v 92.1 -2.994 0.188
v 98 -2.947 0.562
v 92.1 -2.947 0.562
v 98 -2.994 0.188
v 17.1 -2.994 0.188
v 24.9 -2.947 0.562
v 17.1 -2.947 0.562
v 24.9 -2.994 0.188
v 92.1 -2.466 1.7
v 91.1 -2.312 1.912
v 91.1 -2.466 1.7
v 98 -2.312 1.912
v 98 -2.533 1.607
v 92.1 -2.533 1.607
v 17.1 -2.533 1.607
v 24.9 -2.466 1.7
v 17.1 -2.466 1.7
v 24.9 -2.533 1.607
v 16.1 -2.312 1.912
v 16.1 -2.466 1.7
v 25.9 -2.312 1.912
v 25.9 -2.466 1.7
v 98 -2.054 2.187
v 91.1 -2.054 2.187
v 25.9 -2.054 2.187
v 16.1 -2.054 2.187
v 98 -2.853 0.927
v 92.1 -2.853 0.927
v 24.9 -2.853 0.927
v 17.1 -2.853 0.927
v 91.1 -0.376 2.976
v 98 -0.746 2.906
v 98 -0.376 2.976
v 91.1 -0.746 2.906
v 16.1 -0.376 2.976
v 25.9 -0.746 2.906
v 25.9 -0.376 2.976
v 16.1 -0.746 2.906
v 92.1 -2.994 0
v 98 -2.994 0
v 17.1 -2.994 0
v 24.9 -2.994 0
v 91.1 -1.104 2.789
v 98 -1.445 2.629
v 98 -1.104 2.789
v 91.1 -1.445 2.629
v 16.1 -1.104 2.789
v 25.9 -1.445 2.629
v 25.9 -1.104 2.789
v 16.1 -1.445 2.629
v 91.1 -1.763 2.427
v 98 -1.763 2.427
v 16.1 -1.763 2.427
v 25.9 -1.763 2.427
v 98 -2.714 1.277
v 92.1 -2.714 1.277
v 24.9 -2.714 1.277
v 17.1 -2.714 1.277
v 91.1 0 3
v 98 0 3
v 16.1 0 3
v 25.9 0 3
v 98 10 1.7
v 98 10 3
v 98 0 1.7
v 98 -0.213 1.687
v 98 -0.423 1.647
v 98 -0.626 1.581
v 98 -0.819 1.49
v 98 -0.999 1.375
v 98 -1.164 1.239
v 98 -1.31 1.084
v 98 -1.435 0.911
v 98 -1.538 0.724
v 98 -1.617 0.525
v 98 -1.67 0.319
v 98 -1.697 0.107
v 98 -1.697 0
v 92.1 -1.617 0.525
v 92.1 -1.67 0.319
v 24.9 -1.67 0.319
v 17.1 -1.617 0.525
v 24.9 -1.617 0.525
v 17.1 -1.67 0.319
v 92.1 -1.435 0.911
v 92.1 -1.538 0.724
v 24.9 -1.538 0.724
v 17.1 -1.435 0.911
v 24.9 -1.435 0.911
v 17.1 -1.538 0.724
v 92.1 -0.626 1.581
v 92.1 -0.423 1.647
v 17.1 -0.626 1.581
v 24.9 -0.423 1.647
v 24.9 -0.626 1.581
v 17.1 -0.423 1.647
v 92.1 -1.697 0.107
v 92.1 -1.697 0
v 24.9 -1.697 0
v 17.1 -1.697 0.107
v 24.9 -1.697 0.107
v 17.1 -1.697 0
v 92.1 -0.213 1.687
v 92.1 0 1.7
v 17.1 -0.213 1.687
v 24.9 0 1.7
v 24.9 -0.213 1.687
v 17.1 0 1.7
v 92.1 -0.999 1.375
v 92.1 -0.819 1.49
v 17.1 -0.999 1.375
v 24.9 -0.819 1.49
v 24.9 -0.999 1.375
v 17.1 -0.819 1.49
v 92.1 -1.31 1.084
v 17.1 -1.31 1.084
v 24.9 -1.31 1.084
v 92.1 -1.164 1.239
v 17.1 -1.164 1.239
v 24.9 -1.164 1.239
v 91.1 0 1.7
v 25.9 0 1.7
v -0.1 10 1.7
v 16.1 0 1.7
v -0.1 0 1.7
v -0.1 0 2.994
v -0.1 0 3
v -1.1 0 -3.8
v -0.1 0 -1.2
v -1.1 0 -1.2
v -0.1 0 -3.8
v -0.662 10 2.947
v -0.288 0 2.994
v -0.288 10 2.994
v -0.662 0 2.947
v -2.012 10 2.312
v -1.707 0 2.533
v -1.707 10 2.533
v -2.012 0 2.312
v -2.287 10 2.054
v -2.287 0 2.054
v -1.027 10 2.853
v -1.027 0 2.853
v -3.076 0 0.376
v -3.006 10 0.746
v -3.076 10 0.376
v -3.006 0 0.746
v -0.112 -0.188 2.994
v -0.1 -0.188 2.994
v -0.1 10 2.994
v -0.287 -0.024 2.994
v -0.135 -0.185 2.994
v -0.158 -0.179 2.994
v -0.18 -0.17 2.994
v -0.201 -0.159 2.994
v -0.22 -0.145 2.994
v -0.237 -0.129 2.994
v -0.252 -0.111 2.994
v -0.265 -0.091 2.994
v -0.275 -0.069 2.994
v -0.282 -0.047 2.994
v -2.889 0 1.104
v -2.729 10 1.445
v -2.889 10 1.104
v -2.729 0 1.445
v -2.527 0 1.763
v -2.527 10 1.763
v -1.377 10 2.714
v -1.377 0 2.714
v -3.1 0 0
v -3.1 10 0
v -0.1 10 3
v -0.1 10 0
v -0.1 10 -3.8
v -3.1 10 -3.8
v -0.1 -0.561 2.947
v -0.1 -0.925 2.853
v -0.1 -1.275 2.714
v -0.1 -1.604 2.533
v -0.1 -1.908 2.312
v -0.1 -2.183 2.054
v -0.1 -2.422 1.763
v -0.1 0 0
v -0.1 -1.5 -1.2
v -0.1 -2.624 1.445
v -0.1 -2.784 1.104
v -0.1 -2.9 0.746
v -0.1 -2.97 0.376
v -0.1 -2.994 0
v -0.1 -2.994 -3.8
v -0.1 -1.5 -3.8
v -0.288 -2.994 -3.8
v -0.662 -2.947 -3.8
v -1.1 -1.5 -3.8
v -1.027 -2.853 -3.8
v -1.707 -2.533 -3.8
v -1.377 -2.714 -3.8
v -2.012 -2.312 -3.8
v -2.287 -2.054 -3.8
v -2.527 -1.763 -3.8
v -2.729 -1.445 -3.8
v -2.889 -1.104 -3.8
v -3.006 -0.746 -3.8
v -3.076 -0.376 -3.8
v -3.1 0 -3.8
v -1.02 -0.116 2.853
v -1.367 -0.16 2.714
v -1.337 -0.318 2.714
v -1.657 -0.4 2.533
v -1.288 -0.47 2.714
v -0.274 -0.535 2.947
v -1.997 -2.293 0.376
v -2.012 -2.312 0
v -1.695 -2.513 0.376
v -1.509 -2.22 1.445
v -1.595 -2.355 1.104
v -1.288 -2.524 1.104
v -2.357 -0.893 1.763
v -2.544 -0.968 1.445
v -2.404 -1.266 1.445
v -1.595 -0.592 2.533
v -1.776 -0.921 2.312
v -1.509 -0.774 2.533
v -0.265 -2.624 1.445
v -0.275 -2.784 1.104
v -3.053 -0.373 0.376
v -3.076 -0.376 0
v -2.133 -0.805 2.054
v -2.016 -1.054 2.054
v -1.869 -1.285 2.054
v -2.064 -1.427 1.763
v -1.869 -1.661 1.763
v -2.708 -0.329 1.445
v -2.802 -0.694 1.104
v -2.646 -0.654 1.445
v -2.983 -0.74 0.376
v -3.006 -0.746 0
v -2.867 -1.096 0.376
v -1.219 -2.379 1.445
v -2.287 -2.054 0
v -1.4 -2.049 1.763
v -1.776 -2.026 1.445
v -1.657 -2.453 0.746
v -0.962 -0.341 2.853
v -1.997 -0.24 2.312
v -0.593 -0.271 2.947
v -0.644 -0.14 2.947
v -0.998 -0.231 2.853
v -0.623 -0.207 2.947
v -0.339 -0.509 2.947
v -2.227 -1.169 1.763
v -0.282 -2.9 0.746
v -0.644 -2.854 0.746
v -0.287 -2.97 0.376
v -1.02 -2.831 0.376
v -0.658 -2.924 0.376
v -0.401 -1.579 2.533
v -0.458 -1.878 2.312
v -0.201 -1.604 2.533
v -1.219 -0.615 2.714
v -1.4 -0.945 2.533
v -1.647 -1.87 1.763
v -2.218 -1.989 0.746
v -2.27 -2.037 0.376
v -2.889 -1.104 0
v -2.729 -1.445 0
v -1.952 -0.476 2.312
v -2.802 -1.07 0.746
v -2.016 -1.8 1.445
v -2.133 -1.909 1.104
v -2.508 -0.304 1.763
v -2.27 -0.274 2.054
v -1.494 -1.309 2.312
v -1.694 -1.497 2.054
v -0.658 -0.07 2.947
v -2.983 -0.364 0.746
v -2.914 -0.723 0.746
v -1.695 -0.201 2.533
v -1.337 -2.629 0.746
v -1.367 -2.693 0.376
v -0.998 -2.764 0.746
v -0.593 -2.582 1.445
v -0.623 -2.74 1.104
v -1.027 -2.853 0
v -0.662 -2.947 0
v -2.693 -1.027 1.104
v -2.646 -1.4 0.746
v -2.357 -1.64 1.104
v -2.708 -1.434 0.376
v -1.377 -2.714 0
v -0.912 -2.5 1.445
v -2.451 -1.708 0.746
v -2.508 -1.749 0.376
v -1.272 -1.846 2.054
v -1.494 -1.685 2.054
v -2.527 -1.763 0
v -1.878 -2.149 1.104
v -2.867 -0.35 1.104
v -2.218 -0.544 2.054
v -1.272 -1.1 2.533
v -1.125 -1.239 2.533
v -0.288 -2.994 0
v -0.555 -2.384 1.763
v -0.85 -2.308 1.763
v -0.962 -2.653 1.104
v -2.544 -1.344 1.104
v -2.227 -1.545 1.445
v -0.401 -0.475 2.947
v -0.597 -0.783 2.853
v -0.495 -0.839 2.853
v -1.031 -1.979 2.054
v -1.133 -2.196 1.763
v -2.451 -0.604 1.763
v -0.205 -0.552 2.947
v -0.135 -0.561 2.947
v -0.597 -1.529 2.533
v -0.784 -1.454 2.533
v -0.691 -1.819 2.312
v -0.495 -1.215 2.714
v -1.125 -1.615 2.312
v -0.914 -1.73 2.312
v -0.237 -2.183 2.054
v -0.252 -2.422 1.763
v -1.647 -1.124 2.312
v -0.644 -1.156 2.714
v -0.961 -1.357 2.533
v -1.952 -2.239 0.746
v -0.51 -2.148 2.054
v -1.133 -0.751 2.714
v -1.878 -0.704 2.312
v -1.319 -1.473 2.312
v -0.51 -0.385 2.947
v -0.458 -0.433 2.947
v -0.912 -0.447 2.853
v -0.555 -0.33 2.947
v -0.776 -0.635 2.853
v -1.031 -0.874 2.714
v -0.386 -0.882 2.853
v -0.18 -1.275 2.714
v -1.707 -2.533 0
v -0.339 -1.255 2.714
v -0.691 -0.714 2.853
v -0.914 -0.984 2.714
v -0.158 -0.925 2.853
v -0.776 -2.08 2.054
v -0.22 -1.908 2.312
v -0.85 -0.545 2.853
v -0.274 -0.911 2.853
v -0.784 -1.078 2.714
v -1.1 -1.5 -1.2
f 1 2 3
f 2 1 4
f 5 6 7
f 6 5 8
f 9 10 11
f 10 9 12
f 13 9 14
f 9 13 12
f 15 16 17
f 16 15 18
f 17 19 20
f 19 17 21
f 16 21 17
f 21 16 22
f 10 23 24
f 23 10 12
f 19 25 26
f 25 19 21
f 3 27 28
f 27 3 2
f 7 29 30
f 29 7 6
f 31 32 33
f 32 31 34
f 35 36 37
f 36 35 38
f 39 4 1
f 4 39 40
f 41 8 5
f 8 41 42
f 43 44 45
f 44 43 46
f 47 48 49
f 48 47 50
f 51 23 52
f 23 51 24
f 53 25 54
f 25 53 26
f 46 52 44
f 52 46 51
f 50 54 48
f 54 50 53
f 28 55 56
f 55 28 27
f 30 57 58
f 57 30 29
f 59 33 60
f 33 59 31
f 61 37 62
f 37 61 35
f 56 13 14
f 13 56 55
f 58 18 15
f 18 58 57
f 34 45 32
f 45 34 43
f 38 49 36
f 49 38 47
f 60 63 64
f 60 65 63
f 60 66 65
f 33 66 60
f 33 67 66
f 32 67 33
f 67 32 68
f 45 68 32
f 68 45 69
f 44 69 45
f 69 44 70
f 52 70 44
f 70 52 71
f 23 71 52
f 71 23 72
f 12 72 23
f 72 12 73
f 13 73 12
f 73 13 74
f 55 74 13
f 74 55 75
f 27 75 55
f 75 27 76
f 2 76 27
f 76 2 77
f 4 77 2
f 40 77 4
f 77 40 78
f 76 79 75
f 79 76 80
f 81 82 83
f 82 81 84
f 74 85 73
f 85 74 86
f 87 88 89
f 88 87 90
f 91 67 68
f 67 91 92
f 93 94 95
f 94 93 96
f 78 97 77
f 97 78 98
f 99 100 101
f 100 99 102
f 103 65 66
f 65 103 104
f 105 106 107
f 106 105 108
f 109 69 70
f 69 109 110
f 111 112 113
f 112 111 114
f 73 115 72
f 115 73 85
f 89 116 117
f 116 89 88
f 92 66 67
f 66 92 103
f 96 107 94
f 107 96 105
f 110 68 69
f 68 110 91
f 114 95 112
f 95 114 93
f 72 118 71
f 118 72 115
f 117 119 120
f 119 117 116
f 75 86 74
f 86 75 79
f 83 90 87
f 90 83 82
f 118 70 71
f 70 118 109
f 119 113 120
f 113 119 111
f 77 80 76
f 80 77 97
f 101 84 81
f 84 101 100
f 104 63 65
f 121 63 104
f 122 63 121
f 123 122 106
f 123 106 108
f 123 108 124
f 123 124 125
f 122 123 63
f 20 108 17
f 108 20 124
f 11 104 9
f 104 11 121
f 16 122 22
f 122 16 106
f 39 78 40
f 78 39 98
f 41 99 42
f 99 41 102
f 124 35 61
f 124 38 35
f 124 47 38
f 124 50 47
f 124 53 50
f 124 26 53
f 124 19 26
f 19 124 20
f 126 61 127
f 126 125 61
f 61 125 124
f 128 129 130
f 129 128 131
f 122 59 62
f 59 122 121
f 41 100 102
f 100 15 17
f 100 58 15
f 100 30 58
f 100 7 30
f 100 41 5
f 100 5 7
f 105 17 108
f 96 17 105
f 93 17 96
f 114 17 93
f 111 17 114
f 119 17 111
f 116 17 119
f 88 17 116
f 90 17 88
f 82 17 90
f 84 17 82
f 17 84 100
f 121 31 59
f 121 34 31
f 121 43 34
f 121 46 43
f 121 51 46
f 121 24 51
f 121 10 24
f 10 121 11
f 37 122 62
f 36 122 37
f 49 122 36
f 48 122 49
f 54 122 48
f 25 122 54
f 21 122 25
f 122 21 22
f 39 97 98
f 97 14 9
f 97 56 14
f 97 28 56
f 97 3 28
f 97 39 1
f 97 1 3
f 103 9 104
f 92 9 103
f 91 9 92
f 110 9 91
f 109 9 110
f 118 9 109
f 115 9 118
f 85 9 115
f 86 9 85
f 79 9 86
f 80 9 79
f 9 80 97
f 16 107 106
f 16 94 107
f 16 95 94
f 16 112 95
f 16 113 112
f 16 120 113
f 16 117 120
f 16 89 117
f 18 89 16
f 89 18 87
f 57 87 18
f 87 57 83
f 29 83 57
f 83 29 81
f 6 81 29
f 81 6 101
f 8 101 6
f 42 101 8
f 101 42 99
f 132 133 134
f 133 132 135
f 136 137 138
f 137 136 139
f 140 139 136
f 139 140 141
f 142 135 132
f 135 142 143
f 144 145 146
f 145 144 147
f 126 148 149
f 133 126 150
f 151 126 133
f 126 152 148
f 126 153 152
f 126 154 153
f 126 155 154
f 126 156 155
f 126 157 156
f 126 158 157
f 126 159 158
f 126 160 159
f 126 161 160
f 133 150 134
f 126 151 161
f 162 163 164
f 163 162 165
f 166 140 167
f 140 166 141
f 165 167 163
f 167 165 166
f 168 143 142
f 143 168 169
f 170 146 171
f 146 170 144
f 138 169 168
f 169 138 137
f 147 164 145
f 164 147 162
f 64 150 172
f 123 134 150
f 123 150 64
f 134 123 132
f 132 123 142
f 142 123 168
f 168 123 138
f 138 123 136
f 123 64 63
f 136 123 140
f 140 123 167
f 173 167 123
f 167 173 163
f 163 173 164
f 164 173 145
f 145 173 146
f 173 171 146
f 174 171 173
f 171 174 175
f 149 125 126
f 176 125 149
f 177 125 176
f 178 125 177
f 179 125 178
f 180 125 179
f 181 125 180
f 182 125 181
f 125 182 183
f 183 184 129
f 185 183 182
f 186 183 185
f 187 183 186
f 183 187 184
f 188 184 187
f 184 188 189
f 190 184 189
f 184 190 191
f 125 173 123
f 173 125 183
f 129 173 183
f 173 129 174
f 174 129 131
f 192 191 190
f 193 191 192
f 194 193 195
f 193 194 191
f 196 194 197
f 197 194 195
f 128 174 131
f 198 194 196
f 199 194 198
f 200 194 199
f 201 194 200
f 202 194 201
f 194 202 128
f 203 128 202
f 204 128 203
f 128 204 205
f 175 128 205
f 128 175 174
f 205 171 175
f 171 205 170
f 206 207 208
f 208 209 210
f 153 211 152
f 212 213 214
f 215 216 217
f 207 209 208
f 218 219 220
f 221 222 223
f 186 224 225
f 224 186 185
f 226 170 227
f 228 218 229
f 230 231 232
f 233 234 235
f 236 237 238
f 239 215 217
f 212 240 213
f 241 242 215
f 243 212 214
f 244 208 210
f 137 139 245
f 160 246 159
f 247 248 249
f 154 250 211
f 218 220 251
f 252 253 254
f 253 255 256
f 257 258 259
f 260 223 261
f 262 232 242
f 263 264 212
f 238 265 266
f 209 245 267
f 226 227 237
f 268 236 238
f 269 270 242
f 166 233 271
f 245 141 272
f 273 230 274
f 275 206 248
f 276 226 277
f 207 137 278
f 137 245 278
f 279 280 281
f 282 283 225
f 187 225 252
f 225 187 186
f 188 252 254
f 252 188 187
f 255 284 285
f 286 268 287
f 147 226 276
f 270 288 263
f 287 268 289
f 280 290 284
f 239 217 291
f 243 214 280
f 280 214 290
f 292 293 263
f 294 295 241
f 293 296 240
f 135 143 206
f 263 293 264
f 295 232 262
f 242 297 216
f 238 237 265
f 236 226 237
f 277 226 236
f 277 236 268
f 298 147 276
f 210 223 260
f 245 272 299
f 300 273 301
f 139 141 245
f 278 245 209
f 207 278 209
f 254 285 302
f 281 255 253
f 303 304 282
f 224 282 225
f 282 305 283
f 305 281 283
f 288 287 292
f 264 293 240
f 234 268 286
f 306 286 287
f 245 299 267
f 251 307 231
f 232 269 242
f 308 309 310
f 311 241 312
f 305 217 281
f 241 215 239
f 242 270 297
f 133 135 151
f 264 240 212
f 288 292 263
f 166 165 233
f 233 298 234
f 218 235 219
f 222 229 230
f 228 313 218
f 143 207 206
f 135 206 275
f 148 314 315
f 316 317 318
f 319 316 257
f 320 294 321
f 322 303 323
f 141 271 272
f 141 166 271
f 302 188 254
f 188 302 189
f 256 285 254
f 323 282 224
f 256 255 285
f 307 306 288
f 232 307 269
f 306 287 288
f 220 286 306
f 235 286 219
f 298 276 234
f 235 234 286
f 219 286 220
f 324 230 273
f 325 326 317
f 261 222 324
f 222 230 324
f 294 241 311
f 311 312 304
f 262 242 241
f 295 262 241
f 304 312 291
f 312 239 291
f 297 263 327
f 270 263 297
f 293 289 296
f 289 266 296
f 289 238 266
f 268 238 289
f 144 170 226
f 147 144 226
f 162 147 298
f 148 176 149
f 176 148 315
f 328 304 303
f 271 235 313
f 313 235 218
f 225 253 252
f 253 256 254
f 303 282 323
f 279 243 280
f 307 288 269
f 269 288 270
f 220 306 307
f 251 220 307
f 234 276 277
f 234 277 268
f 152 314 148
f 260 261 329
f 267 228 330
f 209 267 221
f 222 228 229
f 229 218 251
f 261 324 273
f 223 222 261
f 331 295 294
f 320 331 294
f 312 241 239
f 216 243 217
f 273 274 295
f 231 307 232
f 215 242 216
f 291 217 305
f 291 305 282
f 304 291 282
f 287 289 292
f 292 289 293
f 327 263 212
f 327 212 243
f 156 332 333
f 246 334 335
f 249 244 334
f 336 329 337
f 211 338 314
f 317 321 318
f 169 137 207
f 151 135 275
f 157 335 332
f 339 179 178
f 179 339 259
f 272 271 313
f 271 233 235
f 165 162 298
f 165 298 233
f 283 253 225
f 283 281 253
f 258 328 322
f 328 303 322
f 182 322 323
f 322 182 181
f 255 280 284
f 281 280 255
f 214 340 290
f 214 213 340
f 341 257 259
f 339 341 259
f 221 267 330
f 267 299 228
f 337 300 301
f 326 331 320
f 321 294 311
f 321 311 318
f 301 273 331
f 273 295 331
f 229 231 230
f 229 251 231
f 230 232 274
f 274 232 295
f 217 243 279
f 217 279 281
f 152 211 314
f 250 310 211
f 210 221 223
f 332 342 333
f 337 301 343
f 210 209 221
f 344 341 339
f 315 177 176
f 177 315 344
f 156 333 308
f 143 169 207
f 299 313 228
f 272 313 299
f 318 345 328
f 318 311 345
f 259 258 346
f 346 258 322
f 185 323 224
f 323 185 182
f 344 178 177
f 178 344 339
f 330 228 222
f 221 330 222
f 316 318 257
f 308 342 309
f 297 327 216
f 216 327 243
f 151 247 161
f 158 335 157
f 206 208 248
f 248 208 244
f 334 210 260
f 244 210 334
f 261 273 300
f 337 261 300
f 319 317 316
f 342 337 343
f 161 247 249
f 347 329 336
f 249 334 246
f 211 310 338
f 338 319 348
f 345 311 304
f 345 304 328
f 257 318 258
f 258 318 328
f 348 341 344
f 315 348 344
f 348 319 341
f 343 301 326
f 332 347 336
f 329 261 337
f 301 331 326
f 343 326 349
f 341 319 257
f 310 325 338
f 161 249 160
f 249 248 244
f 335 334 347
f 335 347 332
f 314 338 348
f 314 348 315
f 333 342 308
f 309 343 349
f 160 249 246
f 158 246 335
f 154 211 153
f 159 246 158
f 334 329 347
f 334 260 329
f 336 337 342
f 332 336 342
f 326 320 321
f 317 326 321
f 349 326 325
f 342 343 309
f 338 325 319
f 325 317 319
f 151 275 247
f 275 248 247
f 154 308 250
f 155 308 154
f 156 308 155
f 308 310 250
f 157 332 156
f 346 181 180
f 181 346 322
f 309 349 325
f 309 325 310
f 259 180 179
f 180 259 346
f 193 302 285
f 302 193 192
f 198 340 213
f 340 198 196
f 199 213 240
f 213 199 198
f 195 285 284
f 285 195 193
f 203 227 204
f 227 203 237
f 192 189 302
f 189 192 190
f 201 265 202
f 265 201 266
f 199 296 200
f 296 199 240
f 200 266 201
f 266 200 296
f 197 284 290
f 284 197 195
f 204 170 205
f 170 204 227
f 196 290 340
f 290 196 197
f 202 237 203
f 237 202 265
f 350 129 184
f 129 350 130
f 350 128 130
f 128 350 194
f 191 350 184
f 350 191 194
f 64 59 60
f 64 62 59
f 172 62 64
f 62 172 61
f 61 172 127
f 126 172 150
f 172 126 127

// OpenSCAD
$fn=50;


offset = 0.1;

rotate([0,90,0])
difference(){
    cylinder(100-2, r=3);
    translate([0,0,-5])cylinder(110, r=3-1.3);
    translate([-3+1.3,0,-5])cube([5,5,110]);
    translate([-5,-5,0]) cube([5,5,16+offset]);
    translate([-3+1.3,-5,+1]) cube([5,5,16+offset]);
    
    translate([-5,-5,16+10-offset]) cube([5,5,65+offset*2]);
    #translate([-3+1.3,-5,16+10-offset-1]) cube([5,5,65+offset*2+2]);
    translate([0,-5,-5])cube([5,5,110]);
    
    
}

translate([-offset,0,3-1.3]) cube([100-2+offset,10,1.3]);

translate([-offset,0,0]){
    difference(){
        rotate([-90,0,0])
        cylinder(10, r=3);
        
        translate([0,0,-5+3-1.3]) cube([5,20,5]);
    }

    translate([-3,0,-5.5+3-1.3]) cube([3,10,5.5+1.3-3]);
    
}

translate([-offset,0,0])
difference(){
    union(){
        sphere(3);
        translate([0,0,-5.5+3-1.3]) cylinder(5.5+1.3-3, r=3);
    }
    translate([0,-3,-5])cube([6,6,10]);
    
    #translate([-1,-1.5,-10+3-1.3-3+offset])cube([1,1.5,10]);
}
